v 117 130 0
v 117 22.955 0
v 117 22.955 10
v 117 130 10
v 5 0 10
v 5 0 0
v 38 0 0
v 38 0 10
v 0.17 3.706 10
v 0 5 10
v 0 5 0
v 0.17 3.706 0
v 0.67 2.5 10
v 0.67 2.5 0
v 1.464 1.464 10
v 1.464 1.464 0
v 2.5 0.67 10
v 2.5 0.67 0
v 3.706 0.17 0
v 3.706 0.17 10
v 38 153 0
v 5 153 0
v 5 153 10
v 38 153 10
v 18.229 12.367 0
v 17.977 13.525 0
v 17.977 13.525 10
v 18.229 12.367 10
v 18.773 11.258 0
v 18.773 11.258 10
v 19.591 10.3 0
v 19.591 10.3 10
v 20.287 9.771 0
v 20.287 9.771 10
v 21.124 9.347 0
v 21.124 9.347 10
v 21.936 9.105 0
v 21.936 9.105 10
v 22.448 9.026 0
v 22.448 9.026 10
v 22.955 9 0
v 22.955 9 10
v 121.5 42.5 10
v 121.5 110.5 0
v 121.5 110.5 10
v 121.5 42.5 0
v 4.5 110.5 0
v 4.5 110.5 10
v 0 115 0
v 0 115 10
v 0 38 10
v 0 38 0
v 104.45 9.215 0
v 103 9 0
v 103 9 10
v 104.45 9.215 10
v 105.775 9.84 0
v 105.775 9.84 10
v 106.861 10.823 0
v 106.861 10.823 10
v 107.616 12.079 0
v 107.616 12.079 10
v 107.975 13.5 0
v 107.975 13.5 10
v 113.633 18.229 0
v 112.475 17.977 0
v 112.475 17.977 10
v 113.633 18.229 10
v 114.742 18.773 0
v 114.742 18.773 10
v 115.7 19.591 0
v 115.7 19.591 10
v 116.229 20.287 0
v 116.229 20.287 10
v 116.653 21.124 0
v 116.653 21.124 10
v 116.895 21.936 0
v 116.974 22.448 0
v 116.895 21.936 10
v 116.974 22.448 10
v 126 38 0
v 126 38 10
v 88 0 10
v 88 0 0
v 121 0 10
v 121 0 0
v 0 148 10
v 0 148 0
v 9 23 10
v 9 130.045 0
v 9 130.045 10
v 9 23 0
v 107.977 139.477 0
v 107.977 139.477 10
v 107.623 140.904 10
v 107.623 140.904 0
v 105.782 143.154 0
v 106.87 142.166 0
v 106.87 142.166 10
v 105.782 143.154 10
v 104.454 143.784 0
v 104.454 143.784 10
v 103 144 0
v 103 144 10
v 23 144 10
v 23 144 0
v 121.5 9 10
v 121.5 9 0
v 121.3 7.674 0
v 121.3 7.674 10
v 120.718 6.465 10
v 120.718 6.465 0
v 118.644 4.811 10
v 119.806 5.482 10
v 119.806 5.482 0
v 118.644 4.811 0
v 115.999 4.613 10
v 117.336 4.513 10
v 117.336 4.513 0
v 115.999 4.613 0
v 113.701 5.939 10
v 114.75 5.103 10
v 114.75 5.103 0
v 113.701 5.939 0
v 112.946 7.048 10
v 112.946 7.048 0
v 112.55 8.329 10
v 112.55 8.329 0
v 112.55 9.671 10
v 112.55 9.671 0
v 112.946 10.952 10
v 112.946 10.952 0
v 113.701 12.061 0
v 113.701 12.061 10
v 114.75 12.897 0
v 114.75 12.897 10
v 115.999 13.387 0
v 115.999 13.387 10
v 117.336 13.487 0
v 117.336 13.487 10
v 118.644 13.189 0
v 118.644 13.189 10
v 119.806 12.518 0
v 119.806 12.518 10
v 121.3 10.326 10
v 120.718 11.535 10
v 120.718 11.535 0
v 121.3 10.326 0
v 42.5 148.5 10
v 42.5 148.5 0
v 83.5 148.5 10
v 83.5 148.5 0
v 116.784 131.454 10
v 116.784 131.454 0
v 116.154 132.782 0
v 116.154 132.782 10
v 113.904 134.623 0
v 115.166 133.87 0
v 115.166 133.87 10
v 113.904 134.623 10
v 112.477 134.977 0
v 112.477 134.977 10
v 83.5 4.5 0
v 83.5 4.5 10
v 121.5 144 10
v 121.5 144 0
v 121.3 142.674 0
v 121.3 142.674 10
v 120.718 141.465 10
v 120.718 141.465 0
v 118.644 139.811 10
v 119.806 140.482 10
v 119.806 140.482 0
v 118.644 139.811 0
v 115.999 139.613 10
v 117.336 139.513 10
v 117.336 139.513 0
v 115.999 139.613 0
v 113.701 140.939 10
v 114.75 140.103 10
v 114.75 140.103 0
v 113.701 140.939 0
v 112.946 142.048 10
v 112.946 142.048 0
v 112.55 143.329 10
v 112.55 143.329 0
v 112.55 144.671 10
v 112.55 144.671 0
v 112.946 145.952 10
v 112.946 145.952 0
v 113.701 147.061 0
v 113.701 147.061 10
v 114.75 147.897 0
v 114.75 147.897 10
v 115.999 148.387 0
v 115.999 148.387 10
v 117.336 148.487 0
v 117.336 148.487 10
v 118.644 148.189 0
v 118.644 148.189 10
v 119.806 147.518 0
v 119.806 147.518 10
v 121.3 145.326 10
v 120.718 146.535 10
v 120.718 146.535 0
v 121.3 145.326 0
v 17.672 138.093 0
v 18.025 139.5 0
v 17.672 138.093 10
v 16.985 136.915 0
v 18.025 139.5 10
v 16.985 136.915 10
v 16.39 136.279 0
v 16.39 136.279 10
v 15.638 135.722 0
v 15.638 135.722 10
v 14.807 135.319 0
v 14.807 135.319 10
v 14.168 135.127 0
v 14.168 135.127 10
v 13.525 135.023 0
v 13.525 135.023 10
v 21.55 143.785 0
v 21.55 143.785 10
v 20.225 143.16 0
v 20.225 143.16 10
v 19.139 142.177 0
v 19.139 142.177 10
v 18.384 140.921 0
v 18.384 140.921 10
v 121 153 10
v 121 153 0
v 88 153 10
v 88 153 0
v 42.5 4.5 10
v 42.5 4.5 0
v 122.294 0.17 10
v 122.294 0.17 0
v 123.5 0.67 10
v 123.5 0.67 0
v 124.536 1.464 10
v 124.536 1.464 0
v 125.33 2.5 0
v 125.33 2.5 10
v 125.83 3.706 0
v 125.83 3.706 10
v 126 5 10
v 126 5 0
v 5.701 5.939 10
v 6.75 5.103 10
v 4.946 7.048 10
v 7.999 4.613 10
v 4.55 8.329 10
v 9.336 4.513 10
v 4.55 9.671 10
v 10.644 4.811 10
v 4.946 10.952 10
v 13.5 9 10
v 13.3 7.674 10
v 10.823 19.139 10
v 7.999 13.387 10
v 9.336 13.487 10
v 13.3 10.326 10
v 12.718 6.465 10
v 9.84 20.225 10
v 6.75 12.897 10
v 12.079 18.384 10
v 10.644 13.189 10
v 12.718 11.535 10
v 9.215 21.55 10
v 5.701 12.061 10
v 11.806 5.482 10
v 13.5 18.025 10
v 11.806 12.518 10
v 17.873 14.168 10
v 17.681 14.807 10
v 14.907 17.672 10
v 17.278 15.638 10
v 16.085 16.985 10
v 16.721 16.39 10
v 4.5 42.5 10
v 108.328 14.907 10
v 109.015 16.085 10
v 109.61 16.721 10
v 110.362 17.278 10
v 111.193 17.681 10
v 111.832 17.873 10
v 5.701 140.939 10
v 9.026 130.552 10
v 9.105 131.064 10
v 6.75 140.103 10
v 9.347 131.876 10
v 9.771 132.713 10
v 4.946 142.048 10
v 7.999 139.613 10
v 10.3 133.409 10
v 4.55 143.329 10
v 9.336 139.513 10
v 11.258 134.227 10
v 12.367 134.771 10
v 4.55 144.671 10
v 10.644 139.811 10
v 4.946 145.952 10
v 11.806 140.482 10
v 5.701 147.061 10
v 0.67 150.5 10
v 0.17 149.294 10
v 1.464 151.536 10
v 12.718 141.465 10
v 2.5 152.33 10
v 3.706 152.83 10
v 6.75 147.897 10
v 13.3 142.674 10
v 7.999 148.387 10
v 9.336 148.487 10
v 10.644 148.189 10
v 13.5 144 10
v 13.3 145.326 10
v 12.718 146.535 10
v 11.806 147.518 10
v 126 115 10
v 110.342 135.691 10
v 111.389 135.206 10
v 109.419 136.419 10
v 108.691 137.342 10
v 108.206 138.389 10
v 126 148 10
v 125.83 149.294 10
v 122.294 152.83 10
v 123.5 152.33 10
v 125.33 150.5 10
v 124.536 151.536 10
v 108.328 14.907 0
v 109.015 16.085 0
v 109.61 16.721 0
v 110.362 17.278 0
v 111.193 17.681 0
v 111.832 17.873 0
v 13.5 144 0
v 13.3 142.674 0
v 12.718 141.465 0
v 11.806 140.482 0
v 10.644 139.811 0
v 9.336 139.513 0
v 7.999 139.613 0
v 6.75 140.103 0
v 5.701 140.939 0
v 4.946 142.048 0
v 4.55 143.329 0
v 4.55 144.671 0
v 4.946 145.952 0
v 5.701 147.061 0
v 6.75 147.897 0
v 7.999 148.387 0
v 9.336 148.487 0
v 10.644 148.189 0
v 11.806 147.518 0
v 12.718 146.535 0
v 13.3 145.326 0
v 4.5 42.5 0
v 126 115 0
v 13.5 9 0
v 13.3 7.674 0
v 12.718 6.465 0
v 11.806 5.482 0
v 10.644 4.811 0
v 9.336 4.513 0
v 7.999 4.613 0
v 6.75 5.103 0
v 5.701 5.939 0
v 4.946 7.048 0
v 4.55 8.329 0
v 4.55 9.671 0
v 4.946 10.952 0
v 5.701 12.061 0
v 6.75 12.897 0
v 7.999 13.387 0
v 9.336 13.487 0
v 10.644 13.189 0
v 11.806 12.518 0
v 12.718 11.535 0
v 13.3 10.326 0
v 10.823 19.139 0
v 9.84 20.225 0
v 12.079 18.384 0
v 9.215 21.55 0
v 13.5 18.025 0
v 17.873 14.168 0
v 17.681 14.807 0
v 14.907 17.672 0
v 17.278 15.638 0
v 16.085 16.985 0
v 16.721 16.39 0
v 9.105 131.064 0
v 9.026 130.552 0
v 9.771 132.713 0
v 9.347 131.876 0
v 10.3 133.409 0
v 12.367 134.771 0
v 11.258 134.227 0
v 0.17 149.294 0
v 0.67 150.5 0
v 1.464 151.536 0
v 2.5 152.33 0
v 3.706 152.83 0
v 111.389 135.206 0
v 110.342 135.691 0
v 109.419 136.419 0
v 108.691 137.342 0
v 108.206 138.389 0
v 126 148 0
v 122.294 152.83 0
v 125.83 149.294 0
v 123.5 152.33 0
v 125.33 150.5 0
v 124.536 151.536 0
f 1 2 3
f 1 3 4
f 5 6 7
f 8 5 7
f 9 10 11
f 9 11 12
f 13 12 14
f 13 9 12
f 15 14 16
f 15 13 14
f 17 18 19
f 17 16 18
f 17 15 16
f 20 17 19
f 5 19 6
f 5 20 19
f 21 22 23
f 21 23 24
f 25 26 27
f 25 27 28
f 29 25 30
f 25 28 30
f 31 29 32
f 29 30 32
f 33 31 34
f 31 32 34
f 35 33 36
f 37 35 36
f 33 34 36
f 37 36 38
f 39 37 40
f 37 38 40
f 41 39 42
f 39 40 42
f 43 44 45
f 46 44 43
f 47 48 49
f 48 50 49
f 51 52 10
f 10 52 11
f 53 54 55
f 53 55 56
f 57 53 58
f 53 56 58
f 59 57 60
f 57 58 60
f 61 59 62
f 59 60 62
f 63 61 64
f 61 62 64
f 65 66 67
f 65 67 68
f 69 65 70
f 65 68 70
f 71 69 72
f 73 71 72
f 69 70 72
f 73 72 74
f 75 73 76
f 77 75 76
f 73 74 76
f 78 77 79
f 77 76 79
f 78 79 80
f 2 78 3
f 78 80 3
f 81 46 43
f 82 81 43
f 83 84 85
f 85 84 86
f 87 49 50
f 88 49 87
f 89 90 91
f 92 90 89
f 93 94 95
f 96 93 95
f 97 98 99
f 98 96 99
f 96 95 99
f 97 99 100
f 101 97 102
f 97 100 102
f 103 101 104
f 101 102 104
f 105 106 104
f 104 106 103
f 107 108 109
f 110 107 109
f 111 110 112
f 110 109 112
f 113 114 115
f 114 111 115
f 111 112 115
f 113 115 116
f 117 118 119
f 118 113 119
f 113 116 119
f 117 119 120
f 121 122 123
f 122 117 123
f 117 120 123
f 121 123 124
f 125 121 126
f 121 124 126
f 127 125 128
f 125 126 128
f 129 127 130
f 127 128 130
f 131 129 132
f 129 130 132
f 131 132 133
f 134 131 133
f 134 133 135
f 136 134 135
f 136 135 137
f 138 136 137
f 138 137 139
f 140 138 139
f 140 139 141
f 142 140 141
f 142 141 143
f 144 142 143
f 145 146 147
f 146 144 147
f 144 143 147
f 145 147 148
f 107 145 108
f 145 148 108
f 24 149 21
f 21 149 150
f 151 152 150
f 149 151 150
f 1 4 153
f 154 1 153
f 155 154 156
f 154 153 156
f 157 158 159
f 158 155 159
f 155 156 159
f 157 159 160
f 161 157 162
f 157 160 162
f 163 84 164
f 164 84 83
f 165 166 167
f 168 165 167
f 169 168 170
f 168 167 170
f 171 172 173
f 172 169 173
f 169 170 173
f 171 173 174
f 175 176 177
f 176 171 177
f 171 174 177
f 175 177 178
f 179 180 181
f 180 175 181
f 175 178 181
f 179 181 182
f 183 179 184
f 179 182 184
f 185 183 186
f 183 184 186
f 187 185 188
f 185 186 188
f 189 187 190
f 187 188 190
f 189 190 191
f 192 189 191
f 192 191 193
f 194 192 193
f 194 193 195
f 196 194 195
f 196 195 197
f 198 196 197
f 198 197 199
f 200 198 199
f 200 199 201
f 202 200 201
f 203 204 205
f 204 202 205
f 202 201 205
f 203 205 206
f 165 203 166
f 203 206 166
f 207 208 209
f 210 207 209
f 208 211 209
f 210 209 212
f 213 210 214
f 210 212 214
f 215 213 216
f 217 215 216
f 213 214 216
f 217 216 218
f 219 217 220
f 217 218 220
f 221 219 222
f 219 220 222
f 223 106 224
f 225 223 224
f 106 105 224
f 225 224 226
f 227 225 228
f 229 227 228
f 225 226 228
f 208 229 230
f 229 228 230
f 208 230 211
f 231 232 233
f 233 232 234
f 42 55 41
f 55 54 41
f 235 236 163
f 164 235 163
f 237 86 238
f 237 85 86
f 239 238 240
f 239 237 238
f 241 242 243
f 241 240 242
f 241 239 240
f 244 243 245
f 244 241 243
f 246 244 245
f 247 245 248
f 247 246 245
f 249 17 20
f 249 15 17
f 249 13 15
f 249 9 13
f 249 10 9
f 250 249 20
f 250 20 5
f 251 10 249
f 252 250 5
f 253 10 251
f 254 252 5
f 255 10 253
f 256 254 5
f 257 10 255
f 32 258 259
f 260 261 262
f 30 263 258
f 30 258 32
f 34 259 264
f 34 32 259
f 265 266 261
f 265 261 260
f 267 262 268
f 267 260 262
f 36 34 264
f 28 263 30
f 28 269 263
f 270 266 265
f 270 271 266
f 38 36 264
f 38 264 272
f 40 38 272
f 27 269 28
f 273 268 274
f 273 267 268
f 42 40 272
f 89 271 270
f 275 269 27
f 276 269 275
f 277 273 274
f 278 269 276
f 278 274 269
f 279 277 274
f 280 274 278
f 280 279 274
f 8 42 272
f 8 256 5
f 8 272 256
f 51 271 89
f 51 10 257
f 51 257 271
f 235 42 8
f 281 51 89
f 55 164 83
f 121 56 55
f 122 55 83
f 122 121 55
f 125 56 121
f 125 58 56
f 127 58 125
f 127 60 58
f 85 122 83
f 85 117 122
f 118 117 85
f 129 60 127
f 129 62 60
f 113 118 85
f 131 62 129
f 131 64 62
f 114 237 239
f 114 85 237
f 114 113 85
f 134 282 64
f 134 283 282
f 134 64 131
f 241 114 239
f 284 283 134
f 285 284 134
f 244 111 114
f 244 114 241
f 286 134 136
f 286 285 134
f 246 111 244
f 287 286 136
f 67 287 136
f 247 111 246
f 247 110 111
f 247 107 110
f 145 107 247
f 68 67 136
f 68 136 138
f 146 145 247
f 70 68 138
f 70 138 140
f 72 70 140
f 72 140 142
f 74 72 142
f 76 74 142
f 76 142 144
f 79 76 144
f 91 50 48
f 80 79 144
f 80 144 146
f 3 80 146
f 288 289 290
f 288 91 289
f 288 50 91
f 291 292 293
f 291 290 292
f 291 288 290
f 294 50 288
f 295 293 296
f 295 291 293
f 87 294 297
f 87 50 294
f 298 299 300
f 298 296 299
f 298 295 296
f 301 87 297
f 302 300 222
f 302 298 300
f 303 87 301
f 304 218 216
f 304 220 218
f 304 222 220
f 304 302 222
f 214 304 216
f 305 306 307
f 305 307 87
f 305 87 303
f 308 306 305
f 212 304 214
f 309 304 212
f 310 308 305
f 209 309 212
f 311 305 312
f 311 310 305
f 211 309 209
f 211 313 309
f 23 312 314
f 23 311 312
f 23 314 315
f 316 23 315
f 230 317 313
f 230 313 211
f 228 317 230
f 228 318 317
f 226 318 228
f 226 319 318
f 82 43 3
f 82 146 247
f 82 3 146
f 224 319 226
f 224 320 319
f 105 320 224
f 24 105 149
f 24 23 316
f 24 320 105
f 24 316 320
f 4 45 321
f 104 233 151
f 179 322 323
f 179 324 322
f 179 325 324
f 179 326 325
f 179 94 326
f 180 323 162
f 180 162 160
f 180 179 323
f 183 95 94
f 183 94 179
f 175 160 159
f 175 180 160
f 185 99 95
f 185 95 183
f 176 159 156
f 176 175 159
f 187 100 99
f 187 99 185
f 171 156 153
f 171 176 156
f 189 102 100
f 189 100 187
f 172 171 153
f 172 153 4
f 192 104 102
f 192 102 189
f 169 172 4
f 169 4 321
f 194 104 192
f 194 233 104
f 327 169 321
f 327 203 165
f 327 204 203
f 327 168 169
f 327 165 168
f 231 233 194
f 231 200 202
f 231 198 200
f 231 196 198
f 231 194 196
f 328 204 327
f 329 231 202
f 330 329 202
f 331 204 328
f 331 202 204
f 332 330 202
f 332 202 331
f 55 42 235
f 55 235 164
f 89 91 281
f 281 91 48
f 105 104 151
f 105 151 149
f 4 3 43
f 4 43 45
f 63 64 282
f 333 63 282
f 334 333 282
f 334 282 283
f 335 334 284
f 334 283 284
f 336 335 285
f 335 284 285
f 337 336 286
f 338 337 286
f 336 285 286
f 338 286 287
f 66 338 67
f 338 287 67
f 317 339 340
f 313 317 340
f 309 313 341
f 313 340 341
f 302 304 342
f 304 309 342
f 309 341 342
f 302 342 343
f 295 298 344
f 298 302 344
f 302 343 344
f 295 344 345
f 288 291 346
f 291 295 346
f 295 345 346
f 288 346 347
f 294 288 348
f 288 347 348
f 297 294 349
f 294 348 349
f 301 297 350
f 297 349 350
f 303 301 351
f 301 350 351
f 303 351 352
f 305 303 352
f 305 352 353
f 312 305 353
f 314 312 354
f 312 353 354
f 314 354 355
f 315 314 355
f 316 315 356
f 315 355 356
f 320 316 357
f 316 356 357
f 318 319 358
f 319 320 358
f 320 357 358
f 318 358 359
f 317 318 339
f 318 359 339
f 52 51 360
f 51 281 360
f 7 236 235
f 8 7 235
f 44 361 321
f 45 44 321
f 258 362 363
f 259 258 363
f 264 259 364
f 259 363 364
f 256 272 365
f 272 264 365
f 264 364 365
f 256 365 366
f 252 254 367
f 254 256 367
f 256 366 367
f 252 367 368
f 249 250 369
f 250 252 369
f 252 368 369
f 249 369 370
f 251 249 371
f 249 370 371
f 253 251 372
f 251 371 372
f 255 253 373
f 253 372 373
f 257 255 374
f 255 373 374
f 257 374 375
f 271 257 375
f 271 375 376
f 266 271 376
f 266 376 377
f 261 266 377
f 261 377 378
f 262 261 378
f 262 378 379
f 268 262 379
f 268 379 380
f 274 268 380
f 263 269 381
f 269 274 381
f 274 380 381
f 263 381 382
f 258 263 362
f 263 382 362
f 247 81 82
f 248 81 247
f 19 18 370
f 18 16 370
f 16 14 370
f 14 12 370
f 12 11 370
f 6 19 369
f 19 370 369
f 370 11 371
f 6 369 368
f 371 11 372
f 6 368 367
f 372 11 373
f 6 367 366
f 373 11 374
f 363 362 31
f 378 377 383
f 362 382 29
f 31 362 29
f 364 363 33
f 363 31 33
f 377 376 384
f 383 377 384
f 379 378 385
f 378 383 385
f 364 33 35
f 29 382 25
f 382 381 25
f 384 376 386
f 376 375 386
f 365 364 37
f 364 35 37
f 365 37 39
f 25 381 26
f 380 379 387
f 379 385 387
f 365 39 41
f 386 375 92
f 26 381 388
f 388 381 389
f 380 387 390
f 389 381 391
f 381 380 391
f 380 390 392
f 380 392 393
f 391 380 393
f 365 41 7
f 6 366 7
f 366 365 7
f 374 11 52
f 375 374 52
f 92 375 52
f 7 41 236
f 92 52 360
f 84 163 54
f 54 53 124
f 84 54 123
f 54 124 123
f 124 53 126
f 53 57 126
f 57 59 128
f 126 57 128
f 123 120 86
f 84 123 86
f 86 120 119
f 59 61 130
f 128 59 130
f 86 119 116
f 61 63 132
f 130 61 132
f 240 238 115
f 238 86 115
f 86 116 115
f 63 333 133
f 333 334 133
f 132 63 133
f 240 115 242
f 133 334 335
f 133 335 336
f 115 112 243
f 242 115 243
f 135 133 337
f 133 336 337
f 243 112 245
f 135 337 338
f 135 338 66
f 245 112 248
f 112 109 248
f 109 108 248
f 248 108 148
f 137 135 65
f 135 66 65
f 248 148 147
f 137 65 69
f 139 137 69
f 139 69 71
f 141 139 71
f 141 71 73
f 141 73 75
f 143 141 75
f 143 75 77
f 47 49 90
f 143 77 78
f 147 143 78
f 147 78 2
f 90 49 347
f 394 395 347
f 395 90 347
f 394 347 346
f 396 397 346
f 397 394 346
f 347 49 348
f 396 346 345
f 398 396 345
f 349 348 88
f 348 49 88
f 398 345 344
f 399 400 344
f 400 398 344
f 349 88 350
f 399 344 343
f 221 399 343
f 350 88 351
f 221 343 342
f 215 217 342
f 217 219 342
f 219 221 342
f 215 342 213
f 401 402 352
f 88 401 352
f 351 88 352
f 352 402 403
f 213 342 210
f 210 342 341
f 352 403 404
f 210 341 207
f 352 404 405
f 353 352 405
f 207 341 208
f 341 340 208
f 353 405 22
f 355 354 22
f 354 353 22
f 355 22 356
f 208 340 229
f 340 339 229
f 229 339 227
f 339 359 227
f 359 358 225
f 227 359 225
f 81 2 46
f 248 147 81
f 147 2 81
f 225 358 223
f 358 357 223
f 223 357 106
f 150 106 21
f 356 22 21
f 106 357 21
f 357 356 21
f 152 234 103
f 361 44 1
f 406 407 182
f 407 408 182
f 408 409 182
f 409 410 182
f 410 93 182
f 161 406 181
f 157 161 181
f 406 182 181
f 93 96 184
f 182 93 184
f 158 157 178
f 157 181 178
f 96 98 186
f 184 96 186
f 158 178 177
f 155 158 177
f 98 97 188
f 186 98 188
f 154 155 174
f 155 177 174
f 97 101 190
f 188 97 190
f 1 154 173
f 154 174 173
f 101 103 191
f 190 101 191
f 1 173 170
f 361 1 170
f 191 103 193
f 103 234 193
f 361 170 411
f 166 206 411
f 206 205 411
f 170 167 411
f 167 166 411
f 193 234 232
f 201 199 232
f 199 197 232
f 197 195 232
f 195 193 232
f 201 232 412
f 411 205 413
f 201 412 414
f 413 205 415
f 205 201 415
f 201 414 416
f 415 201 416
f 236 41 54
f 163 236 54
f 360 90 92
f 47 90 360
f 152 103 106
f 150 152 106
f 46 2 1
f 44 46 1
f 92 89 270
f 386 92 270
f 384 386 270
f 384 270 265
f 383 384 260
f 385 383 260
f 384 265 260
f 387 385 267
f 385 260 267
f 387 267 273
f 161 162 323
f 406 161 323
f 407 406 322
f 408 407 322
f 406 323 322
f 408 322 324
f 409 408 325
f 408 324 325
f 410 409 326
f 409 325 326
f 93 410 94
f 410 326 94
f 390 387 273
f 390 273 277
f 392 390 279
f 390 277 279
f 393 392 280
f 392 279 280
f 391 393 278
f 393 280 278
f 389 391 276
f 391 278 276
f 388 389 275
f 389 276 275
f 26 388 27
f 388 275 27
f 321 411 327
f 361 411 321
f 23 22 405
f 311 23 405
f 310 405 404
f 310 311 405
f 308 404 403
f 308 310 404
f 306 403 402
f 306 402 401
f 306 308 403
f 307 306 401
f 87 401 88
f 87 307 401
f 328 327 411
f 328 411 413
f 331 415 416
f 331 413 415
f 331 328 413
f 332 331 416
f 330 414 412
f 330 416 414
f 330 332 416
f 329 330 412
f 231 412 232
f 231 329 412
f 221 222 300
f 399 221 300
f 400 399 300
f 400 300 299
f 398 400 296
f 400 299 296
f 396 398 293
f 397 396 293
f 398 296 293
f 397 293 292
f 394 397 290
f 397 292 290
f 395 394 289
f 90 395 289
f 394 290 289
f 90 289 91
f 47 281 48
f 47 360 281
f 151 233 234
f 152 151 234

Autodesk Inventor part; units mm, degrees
ref_plane "YZ Plane" through (0, 0, 0) normal (1, 0, 0) x (0, 1, 0)
ref_plane "XZ Plane" through (0, 0, 0) normal (0, 1, 0) x (-1, 0, 0)
ref_plane "XY Plane" through (0, 0, 0) normal (0, 0, 1) x (1, 0, 0)
sketch "Sketch1" plane through (0, 0, 0) normal (0, 0, 1) x (1, 0, 0)
  line L0 (0, 18) -> (0, 0) projected
  line L1 (0, 0) -> (18, 0) projected
  line L2 (18, 0) -> (18, 18) projected
  line L3 (18, 18) -> (0, 18) projected
  circle A0 centre (9, 9) radius 4.5 projected
  line L4 (0, 153) -> (18, 153) projected
  line L5 (0, 135) -> (0, 153) projected
  line L6 (18, 135) -> (0, 135) projected
  line L7 (18, 153) -> (18, 135) projected
  line L8 (0, 153) -> (18, 153) projected
  circle A1 centre (9, 144) radius 4.5 projected
  line L9 (126, 135) -> (126, 153) projected
  line L10 (126, 153) -> (108, 153) projected
  line L11 (108, 153) -> (108, 135) projected
  line L12 (108, 135) -> (126, 135) projected
  circle A2 centre (117, 144) radius 4.5 projected
  line L13 (126, 18) -> (126, 0) projected
  line L14 (108, 18) -> (126, 18) projected
  line L15 (108, 0) -> (108, 18) projected
  line L16 (126, 0) -> (108, 0) projected
  circle A3 centre (117, 9) radius 4.5 projected
  line L17 (18, 0) -> (108, 0)
  line L18 (108, 0) -> (108, 9)
  line L19 (108, 9) -> (18, 9)
  line L20 (18, 9) -> (18, 0)
  line L21 (126, 18) -> (117, 18)
  line L22 (117, 18) -> (117, 135)
  line L23 (117, 135) -> (126, 135)
  line L24 (126, 135) -> (126, 18)
  line L25 (108, 153) -> (18, 153)
  line L26 (18, 153) -> (18, 144)
  line L27 (18, 144) -> (108, 144)
  line L28 (108, 144) -> (108, 153)
  line L29 (0, 135) -> (9, 135)
  line L30 (9, 135) -> (9, 18)
  line L31 (9, 18) -> (0, 18)
  line L32 (0, 18) -> (0, 135)
  line L33 (126, 115) -> (121.5, 115)
  line L34 (121.5, 115) -> (121.5, 38)
  line L35 (121.5, 38) -> (126, 38)
  line L36 (126, 38) -> (126, 115)
  line L37 (88, 0) -> (38, 0)
  line L38 (38, 0) -> (38, 4.5)
  line L39 (38, 4.5) -> (88, 4.5)
  line L40 (88, 4.5) -> (88, 0)
  line L41 (0, 38) -> (4.5, 38)
  line L42 (4.5, 38) -> (4.5, 115)
  line L43 (4.5, 115) -> (0, 115)
  line L44 (0, 115) -> (0, 38)
  line L45 (38, 153) -> (88, 153)
  line L46 (88, 153) -> (88, 148.5)
  line L47 (88, 148.5) -> (38, 148.5)
  line L48 (38, 148.5) -> (38, 153)
  point P0 (18, 9)
  point P1 (38, 0)
  dimension "d0" = 9
  dimension "d1" = 9
  dimension "d2" = 9
  dimension "d3" = 9
  dimension "d4" = 4.5
  dimension "d5" = 4.5
  dimension "d6" = 4.5
  dimension "d7" = 4.5
  dimension "d8" = 20
  dimension "d9" = 20
  dimension "d10" = 20
  dimension "d11" = 20
  dimension "d12" = 20
  dimension "d13" = 20
  dimension "d14" = 20
  dimension "d15" = 20
extrude "Extrusion1" add sketch "Sketch1" along normal blind 10 contours L3 L2 L1 L0 | L32 L41 L42 L43 L6 L30 L3 | L2 L19 L15 L17 L40 L39 L38 | L6 L5 L4 L7 | L15 L14 L13 L16 | L7 L25 L48 L47 L46 L11 L27 | L11 L10 L9 L12 | L22 L12 L24 L33 L34 L35 L14
fillet "Fillet1" radius 5 16 edges at (108, 144, 5) (117, 135, 5) (108, 135, 5) (18, 144, 5) (18, 135, 5) (9, 135, 5) (9, 18, 5) (18, 18, 5) (18, 9, 5) (108, 9, 5) (108, 18, 5) (117, 18, 5) (0, 153, 5) (126, 153, 5) (126, 0, 5) (0, 0, 5)
chamfer "Chamfer1" distance 4.5 angle 45 8 edges at (38, 148.5, 5) (88, 148.5, 5) (121.5, 115, 5) (121.5, 38, 5) (38, 4.5, 5) (88, 4.5, 5) (4.5, 38, 5) (4.5, 115, 5)
equation "\"d1\" = d0"
equation "\"d2\" = d0"
equation "\"d3\" = d0"
equation "\"d4\" = 0.5 * d0"
equation "\"d5\" = 0.5 * d0"
equation "\"d6\" = 0.5 * d0"
equation "\"d7\" = 0.5 * d0"
equation "\"d9\" = d8"
equation "\"d10\" = d8"
equation "\"d11\" = d8"
equation "\"d12\" = d8"
equation "\"d13\" = d8"
equation "\"d14\" = d8"
equation "\"d15\" = d8"
properties part number "Servo-Gear-MountingPlate"
